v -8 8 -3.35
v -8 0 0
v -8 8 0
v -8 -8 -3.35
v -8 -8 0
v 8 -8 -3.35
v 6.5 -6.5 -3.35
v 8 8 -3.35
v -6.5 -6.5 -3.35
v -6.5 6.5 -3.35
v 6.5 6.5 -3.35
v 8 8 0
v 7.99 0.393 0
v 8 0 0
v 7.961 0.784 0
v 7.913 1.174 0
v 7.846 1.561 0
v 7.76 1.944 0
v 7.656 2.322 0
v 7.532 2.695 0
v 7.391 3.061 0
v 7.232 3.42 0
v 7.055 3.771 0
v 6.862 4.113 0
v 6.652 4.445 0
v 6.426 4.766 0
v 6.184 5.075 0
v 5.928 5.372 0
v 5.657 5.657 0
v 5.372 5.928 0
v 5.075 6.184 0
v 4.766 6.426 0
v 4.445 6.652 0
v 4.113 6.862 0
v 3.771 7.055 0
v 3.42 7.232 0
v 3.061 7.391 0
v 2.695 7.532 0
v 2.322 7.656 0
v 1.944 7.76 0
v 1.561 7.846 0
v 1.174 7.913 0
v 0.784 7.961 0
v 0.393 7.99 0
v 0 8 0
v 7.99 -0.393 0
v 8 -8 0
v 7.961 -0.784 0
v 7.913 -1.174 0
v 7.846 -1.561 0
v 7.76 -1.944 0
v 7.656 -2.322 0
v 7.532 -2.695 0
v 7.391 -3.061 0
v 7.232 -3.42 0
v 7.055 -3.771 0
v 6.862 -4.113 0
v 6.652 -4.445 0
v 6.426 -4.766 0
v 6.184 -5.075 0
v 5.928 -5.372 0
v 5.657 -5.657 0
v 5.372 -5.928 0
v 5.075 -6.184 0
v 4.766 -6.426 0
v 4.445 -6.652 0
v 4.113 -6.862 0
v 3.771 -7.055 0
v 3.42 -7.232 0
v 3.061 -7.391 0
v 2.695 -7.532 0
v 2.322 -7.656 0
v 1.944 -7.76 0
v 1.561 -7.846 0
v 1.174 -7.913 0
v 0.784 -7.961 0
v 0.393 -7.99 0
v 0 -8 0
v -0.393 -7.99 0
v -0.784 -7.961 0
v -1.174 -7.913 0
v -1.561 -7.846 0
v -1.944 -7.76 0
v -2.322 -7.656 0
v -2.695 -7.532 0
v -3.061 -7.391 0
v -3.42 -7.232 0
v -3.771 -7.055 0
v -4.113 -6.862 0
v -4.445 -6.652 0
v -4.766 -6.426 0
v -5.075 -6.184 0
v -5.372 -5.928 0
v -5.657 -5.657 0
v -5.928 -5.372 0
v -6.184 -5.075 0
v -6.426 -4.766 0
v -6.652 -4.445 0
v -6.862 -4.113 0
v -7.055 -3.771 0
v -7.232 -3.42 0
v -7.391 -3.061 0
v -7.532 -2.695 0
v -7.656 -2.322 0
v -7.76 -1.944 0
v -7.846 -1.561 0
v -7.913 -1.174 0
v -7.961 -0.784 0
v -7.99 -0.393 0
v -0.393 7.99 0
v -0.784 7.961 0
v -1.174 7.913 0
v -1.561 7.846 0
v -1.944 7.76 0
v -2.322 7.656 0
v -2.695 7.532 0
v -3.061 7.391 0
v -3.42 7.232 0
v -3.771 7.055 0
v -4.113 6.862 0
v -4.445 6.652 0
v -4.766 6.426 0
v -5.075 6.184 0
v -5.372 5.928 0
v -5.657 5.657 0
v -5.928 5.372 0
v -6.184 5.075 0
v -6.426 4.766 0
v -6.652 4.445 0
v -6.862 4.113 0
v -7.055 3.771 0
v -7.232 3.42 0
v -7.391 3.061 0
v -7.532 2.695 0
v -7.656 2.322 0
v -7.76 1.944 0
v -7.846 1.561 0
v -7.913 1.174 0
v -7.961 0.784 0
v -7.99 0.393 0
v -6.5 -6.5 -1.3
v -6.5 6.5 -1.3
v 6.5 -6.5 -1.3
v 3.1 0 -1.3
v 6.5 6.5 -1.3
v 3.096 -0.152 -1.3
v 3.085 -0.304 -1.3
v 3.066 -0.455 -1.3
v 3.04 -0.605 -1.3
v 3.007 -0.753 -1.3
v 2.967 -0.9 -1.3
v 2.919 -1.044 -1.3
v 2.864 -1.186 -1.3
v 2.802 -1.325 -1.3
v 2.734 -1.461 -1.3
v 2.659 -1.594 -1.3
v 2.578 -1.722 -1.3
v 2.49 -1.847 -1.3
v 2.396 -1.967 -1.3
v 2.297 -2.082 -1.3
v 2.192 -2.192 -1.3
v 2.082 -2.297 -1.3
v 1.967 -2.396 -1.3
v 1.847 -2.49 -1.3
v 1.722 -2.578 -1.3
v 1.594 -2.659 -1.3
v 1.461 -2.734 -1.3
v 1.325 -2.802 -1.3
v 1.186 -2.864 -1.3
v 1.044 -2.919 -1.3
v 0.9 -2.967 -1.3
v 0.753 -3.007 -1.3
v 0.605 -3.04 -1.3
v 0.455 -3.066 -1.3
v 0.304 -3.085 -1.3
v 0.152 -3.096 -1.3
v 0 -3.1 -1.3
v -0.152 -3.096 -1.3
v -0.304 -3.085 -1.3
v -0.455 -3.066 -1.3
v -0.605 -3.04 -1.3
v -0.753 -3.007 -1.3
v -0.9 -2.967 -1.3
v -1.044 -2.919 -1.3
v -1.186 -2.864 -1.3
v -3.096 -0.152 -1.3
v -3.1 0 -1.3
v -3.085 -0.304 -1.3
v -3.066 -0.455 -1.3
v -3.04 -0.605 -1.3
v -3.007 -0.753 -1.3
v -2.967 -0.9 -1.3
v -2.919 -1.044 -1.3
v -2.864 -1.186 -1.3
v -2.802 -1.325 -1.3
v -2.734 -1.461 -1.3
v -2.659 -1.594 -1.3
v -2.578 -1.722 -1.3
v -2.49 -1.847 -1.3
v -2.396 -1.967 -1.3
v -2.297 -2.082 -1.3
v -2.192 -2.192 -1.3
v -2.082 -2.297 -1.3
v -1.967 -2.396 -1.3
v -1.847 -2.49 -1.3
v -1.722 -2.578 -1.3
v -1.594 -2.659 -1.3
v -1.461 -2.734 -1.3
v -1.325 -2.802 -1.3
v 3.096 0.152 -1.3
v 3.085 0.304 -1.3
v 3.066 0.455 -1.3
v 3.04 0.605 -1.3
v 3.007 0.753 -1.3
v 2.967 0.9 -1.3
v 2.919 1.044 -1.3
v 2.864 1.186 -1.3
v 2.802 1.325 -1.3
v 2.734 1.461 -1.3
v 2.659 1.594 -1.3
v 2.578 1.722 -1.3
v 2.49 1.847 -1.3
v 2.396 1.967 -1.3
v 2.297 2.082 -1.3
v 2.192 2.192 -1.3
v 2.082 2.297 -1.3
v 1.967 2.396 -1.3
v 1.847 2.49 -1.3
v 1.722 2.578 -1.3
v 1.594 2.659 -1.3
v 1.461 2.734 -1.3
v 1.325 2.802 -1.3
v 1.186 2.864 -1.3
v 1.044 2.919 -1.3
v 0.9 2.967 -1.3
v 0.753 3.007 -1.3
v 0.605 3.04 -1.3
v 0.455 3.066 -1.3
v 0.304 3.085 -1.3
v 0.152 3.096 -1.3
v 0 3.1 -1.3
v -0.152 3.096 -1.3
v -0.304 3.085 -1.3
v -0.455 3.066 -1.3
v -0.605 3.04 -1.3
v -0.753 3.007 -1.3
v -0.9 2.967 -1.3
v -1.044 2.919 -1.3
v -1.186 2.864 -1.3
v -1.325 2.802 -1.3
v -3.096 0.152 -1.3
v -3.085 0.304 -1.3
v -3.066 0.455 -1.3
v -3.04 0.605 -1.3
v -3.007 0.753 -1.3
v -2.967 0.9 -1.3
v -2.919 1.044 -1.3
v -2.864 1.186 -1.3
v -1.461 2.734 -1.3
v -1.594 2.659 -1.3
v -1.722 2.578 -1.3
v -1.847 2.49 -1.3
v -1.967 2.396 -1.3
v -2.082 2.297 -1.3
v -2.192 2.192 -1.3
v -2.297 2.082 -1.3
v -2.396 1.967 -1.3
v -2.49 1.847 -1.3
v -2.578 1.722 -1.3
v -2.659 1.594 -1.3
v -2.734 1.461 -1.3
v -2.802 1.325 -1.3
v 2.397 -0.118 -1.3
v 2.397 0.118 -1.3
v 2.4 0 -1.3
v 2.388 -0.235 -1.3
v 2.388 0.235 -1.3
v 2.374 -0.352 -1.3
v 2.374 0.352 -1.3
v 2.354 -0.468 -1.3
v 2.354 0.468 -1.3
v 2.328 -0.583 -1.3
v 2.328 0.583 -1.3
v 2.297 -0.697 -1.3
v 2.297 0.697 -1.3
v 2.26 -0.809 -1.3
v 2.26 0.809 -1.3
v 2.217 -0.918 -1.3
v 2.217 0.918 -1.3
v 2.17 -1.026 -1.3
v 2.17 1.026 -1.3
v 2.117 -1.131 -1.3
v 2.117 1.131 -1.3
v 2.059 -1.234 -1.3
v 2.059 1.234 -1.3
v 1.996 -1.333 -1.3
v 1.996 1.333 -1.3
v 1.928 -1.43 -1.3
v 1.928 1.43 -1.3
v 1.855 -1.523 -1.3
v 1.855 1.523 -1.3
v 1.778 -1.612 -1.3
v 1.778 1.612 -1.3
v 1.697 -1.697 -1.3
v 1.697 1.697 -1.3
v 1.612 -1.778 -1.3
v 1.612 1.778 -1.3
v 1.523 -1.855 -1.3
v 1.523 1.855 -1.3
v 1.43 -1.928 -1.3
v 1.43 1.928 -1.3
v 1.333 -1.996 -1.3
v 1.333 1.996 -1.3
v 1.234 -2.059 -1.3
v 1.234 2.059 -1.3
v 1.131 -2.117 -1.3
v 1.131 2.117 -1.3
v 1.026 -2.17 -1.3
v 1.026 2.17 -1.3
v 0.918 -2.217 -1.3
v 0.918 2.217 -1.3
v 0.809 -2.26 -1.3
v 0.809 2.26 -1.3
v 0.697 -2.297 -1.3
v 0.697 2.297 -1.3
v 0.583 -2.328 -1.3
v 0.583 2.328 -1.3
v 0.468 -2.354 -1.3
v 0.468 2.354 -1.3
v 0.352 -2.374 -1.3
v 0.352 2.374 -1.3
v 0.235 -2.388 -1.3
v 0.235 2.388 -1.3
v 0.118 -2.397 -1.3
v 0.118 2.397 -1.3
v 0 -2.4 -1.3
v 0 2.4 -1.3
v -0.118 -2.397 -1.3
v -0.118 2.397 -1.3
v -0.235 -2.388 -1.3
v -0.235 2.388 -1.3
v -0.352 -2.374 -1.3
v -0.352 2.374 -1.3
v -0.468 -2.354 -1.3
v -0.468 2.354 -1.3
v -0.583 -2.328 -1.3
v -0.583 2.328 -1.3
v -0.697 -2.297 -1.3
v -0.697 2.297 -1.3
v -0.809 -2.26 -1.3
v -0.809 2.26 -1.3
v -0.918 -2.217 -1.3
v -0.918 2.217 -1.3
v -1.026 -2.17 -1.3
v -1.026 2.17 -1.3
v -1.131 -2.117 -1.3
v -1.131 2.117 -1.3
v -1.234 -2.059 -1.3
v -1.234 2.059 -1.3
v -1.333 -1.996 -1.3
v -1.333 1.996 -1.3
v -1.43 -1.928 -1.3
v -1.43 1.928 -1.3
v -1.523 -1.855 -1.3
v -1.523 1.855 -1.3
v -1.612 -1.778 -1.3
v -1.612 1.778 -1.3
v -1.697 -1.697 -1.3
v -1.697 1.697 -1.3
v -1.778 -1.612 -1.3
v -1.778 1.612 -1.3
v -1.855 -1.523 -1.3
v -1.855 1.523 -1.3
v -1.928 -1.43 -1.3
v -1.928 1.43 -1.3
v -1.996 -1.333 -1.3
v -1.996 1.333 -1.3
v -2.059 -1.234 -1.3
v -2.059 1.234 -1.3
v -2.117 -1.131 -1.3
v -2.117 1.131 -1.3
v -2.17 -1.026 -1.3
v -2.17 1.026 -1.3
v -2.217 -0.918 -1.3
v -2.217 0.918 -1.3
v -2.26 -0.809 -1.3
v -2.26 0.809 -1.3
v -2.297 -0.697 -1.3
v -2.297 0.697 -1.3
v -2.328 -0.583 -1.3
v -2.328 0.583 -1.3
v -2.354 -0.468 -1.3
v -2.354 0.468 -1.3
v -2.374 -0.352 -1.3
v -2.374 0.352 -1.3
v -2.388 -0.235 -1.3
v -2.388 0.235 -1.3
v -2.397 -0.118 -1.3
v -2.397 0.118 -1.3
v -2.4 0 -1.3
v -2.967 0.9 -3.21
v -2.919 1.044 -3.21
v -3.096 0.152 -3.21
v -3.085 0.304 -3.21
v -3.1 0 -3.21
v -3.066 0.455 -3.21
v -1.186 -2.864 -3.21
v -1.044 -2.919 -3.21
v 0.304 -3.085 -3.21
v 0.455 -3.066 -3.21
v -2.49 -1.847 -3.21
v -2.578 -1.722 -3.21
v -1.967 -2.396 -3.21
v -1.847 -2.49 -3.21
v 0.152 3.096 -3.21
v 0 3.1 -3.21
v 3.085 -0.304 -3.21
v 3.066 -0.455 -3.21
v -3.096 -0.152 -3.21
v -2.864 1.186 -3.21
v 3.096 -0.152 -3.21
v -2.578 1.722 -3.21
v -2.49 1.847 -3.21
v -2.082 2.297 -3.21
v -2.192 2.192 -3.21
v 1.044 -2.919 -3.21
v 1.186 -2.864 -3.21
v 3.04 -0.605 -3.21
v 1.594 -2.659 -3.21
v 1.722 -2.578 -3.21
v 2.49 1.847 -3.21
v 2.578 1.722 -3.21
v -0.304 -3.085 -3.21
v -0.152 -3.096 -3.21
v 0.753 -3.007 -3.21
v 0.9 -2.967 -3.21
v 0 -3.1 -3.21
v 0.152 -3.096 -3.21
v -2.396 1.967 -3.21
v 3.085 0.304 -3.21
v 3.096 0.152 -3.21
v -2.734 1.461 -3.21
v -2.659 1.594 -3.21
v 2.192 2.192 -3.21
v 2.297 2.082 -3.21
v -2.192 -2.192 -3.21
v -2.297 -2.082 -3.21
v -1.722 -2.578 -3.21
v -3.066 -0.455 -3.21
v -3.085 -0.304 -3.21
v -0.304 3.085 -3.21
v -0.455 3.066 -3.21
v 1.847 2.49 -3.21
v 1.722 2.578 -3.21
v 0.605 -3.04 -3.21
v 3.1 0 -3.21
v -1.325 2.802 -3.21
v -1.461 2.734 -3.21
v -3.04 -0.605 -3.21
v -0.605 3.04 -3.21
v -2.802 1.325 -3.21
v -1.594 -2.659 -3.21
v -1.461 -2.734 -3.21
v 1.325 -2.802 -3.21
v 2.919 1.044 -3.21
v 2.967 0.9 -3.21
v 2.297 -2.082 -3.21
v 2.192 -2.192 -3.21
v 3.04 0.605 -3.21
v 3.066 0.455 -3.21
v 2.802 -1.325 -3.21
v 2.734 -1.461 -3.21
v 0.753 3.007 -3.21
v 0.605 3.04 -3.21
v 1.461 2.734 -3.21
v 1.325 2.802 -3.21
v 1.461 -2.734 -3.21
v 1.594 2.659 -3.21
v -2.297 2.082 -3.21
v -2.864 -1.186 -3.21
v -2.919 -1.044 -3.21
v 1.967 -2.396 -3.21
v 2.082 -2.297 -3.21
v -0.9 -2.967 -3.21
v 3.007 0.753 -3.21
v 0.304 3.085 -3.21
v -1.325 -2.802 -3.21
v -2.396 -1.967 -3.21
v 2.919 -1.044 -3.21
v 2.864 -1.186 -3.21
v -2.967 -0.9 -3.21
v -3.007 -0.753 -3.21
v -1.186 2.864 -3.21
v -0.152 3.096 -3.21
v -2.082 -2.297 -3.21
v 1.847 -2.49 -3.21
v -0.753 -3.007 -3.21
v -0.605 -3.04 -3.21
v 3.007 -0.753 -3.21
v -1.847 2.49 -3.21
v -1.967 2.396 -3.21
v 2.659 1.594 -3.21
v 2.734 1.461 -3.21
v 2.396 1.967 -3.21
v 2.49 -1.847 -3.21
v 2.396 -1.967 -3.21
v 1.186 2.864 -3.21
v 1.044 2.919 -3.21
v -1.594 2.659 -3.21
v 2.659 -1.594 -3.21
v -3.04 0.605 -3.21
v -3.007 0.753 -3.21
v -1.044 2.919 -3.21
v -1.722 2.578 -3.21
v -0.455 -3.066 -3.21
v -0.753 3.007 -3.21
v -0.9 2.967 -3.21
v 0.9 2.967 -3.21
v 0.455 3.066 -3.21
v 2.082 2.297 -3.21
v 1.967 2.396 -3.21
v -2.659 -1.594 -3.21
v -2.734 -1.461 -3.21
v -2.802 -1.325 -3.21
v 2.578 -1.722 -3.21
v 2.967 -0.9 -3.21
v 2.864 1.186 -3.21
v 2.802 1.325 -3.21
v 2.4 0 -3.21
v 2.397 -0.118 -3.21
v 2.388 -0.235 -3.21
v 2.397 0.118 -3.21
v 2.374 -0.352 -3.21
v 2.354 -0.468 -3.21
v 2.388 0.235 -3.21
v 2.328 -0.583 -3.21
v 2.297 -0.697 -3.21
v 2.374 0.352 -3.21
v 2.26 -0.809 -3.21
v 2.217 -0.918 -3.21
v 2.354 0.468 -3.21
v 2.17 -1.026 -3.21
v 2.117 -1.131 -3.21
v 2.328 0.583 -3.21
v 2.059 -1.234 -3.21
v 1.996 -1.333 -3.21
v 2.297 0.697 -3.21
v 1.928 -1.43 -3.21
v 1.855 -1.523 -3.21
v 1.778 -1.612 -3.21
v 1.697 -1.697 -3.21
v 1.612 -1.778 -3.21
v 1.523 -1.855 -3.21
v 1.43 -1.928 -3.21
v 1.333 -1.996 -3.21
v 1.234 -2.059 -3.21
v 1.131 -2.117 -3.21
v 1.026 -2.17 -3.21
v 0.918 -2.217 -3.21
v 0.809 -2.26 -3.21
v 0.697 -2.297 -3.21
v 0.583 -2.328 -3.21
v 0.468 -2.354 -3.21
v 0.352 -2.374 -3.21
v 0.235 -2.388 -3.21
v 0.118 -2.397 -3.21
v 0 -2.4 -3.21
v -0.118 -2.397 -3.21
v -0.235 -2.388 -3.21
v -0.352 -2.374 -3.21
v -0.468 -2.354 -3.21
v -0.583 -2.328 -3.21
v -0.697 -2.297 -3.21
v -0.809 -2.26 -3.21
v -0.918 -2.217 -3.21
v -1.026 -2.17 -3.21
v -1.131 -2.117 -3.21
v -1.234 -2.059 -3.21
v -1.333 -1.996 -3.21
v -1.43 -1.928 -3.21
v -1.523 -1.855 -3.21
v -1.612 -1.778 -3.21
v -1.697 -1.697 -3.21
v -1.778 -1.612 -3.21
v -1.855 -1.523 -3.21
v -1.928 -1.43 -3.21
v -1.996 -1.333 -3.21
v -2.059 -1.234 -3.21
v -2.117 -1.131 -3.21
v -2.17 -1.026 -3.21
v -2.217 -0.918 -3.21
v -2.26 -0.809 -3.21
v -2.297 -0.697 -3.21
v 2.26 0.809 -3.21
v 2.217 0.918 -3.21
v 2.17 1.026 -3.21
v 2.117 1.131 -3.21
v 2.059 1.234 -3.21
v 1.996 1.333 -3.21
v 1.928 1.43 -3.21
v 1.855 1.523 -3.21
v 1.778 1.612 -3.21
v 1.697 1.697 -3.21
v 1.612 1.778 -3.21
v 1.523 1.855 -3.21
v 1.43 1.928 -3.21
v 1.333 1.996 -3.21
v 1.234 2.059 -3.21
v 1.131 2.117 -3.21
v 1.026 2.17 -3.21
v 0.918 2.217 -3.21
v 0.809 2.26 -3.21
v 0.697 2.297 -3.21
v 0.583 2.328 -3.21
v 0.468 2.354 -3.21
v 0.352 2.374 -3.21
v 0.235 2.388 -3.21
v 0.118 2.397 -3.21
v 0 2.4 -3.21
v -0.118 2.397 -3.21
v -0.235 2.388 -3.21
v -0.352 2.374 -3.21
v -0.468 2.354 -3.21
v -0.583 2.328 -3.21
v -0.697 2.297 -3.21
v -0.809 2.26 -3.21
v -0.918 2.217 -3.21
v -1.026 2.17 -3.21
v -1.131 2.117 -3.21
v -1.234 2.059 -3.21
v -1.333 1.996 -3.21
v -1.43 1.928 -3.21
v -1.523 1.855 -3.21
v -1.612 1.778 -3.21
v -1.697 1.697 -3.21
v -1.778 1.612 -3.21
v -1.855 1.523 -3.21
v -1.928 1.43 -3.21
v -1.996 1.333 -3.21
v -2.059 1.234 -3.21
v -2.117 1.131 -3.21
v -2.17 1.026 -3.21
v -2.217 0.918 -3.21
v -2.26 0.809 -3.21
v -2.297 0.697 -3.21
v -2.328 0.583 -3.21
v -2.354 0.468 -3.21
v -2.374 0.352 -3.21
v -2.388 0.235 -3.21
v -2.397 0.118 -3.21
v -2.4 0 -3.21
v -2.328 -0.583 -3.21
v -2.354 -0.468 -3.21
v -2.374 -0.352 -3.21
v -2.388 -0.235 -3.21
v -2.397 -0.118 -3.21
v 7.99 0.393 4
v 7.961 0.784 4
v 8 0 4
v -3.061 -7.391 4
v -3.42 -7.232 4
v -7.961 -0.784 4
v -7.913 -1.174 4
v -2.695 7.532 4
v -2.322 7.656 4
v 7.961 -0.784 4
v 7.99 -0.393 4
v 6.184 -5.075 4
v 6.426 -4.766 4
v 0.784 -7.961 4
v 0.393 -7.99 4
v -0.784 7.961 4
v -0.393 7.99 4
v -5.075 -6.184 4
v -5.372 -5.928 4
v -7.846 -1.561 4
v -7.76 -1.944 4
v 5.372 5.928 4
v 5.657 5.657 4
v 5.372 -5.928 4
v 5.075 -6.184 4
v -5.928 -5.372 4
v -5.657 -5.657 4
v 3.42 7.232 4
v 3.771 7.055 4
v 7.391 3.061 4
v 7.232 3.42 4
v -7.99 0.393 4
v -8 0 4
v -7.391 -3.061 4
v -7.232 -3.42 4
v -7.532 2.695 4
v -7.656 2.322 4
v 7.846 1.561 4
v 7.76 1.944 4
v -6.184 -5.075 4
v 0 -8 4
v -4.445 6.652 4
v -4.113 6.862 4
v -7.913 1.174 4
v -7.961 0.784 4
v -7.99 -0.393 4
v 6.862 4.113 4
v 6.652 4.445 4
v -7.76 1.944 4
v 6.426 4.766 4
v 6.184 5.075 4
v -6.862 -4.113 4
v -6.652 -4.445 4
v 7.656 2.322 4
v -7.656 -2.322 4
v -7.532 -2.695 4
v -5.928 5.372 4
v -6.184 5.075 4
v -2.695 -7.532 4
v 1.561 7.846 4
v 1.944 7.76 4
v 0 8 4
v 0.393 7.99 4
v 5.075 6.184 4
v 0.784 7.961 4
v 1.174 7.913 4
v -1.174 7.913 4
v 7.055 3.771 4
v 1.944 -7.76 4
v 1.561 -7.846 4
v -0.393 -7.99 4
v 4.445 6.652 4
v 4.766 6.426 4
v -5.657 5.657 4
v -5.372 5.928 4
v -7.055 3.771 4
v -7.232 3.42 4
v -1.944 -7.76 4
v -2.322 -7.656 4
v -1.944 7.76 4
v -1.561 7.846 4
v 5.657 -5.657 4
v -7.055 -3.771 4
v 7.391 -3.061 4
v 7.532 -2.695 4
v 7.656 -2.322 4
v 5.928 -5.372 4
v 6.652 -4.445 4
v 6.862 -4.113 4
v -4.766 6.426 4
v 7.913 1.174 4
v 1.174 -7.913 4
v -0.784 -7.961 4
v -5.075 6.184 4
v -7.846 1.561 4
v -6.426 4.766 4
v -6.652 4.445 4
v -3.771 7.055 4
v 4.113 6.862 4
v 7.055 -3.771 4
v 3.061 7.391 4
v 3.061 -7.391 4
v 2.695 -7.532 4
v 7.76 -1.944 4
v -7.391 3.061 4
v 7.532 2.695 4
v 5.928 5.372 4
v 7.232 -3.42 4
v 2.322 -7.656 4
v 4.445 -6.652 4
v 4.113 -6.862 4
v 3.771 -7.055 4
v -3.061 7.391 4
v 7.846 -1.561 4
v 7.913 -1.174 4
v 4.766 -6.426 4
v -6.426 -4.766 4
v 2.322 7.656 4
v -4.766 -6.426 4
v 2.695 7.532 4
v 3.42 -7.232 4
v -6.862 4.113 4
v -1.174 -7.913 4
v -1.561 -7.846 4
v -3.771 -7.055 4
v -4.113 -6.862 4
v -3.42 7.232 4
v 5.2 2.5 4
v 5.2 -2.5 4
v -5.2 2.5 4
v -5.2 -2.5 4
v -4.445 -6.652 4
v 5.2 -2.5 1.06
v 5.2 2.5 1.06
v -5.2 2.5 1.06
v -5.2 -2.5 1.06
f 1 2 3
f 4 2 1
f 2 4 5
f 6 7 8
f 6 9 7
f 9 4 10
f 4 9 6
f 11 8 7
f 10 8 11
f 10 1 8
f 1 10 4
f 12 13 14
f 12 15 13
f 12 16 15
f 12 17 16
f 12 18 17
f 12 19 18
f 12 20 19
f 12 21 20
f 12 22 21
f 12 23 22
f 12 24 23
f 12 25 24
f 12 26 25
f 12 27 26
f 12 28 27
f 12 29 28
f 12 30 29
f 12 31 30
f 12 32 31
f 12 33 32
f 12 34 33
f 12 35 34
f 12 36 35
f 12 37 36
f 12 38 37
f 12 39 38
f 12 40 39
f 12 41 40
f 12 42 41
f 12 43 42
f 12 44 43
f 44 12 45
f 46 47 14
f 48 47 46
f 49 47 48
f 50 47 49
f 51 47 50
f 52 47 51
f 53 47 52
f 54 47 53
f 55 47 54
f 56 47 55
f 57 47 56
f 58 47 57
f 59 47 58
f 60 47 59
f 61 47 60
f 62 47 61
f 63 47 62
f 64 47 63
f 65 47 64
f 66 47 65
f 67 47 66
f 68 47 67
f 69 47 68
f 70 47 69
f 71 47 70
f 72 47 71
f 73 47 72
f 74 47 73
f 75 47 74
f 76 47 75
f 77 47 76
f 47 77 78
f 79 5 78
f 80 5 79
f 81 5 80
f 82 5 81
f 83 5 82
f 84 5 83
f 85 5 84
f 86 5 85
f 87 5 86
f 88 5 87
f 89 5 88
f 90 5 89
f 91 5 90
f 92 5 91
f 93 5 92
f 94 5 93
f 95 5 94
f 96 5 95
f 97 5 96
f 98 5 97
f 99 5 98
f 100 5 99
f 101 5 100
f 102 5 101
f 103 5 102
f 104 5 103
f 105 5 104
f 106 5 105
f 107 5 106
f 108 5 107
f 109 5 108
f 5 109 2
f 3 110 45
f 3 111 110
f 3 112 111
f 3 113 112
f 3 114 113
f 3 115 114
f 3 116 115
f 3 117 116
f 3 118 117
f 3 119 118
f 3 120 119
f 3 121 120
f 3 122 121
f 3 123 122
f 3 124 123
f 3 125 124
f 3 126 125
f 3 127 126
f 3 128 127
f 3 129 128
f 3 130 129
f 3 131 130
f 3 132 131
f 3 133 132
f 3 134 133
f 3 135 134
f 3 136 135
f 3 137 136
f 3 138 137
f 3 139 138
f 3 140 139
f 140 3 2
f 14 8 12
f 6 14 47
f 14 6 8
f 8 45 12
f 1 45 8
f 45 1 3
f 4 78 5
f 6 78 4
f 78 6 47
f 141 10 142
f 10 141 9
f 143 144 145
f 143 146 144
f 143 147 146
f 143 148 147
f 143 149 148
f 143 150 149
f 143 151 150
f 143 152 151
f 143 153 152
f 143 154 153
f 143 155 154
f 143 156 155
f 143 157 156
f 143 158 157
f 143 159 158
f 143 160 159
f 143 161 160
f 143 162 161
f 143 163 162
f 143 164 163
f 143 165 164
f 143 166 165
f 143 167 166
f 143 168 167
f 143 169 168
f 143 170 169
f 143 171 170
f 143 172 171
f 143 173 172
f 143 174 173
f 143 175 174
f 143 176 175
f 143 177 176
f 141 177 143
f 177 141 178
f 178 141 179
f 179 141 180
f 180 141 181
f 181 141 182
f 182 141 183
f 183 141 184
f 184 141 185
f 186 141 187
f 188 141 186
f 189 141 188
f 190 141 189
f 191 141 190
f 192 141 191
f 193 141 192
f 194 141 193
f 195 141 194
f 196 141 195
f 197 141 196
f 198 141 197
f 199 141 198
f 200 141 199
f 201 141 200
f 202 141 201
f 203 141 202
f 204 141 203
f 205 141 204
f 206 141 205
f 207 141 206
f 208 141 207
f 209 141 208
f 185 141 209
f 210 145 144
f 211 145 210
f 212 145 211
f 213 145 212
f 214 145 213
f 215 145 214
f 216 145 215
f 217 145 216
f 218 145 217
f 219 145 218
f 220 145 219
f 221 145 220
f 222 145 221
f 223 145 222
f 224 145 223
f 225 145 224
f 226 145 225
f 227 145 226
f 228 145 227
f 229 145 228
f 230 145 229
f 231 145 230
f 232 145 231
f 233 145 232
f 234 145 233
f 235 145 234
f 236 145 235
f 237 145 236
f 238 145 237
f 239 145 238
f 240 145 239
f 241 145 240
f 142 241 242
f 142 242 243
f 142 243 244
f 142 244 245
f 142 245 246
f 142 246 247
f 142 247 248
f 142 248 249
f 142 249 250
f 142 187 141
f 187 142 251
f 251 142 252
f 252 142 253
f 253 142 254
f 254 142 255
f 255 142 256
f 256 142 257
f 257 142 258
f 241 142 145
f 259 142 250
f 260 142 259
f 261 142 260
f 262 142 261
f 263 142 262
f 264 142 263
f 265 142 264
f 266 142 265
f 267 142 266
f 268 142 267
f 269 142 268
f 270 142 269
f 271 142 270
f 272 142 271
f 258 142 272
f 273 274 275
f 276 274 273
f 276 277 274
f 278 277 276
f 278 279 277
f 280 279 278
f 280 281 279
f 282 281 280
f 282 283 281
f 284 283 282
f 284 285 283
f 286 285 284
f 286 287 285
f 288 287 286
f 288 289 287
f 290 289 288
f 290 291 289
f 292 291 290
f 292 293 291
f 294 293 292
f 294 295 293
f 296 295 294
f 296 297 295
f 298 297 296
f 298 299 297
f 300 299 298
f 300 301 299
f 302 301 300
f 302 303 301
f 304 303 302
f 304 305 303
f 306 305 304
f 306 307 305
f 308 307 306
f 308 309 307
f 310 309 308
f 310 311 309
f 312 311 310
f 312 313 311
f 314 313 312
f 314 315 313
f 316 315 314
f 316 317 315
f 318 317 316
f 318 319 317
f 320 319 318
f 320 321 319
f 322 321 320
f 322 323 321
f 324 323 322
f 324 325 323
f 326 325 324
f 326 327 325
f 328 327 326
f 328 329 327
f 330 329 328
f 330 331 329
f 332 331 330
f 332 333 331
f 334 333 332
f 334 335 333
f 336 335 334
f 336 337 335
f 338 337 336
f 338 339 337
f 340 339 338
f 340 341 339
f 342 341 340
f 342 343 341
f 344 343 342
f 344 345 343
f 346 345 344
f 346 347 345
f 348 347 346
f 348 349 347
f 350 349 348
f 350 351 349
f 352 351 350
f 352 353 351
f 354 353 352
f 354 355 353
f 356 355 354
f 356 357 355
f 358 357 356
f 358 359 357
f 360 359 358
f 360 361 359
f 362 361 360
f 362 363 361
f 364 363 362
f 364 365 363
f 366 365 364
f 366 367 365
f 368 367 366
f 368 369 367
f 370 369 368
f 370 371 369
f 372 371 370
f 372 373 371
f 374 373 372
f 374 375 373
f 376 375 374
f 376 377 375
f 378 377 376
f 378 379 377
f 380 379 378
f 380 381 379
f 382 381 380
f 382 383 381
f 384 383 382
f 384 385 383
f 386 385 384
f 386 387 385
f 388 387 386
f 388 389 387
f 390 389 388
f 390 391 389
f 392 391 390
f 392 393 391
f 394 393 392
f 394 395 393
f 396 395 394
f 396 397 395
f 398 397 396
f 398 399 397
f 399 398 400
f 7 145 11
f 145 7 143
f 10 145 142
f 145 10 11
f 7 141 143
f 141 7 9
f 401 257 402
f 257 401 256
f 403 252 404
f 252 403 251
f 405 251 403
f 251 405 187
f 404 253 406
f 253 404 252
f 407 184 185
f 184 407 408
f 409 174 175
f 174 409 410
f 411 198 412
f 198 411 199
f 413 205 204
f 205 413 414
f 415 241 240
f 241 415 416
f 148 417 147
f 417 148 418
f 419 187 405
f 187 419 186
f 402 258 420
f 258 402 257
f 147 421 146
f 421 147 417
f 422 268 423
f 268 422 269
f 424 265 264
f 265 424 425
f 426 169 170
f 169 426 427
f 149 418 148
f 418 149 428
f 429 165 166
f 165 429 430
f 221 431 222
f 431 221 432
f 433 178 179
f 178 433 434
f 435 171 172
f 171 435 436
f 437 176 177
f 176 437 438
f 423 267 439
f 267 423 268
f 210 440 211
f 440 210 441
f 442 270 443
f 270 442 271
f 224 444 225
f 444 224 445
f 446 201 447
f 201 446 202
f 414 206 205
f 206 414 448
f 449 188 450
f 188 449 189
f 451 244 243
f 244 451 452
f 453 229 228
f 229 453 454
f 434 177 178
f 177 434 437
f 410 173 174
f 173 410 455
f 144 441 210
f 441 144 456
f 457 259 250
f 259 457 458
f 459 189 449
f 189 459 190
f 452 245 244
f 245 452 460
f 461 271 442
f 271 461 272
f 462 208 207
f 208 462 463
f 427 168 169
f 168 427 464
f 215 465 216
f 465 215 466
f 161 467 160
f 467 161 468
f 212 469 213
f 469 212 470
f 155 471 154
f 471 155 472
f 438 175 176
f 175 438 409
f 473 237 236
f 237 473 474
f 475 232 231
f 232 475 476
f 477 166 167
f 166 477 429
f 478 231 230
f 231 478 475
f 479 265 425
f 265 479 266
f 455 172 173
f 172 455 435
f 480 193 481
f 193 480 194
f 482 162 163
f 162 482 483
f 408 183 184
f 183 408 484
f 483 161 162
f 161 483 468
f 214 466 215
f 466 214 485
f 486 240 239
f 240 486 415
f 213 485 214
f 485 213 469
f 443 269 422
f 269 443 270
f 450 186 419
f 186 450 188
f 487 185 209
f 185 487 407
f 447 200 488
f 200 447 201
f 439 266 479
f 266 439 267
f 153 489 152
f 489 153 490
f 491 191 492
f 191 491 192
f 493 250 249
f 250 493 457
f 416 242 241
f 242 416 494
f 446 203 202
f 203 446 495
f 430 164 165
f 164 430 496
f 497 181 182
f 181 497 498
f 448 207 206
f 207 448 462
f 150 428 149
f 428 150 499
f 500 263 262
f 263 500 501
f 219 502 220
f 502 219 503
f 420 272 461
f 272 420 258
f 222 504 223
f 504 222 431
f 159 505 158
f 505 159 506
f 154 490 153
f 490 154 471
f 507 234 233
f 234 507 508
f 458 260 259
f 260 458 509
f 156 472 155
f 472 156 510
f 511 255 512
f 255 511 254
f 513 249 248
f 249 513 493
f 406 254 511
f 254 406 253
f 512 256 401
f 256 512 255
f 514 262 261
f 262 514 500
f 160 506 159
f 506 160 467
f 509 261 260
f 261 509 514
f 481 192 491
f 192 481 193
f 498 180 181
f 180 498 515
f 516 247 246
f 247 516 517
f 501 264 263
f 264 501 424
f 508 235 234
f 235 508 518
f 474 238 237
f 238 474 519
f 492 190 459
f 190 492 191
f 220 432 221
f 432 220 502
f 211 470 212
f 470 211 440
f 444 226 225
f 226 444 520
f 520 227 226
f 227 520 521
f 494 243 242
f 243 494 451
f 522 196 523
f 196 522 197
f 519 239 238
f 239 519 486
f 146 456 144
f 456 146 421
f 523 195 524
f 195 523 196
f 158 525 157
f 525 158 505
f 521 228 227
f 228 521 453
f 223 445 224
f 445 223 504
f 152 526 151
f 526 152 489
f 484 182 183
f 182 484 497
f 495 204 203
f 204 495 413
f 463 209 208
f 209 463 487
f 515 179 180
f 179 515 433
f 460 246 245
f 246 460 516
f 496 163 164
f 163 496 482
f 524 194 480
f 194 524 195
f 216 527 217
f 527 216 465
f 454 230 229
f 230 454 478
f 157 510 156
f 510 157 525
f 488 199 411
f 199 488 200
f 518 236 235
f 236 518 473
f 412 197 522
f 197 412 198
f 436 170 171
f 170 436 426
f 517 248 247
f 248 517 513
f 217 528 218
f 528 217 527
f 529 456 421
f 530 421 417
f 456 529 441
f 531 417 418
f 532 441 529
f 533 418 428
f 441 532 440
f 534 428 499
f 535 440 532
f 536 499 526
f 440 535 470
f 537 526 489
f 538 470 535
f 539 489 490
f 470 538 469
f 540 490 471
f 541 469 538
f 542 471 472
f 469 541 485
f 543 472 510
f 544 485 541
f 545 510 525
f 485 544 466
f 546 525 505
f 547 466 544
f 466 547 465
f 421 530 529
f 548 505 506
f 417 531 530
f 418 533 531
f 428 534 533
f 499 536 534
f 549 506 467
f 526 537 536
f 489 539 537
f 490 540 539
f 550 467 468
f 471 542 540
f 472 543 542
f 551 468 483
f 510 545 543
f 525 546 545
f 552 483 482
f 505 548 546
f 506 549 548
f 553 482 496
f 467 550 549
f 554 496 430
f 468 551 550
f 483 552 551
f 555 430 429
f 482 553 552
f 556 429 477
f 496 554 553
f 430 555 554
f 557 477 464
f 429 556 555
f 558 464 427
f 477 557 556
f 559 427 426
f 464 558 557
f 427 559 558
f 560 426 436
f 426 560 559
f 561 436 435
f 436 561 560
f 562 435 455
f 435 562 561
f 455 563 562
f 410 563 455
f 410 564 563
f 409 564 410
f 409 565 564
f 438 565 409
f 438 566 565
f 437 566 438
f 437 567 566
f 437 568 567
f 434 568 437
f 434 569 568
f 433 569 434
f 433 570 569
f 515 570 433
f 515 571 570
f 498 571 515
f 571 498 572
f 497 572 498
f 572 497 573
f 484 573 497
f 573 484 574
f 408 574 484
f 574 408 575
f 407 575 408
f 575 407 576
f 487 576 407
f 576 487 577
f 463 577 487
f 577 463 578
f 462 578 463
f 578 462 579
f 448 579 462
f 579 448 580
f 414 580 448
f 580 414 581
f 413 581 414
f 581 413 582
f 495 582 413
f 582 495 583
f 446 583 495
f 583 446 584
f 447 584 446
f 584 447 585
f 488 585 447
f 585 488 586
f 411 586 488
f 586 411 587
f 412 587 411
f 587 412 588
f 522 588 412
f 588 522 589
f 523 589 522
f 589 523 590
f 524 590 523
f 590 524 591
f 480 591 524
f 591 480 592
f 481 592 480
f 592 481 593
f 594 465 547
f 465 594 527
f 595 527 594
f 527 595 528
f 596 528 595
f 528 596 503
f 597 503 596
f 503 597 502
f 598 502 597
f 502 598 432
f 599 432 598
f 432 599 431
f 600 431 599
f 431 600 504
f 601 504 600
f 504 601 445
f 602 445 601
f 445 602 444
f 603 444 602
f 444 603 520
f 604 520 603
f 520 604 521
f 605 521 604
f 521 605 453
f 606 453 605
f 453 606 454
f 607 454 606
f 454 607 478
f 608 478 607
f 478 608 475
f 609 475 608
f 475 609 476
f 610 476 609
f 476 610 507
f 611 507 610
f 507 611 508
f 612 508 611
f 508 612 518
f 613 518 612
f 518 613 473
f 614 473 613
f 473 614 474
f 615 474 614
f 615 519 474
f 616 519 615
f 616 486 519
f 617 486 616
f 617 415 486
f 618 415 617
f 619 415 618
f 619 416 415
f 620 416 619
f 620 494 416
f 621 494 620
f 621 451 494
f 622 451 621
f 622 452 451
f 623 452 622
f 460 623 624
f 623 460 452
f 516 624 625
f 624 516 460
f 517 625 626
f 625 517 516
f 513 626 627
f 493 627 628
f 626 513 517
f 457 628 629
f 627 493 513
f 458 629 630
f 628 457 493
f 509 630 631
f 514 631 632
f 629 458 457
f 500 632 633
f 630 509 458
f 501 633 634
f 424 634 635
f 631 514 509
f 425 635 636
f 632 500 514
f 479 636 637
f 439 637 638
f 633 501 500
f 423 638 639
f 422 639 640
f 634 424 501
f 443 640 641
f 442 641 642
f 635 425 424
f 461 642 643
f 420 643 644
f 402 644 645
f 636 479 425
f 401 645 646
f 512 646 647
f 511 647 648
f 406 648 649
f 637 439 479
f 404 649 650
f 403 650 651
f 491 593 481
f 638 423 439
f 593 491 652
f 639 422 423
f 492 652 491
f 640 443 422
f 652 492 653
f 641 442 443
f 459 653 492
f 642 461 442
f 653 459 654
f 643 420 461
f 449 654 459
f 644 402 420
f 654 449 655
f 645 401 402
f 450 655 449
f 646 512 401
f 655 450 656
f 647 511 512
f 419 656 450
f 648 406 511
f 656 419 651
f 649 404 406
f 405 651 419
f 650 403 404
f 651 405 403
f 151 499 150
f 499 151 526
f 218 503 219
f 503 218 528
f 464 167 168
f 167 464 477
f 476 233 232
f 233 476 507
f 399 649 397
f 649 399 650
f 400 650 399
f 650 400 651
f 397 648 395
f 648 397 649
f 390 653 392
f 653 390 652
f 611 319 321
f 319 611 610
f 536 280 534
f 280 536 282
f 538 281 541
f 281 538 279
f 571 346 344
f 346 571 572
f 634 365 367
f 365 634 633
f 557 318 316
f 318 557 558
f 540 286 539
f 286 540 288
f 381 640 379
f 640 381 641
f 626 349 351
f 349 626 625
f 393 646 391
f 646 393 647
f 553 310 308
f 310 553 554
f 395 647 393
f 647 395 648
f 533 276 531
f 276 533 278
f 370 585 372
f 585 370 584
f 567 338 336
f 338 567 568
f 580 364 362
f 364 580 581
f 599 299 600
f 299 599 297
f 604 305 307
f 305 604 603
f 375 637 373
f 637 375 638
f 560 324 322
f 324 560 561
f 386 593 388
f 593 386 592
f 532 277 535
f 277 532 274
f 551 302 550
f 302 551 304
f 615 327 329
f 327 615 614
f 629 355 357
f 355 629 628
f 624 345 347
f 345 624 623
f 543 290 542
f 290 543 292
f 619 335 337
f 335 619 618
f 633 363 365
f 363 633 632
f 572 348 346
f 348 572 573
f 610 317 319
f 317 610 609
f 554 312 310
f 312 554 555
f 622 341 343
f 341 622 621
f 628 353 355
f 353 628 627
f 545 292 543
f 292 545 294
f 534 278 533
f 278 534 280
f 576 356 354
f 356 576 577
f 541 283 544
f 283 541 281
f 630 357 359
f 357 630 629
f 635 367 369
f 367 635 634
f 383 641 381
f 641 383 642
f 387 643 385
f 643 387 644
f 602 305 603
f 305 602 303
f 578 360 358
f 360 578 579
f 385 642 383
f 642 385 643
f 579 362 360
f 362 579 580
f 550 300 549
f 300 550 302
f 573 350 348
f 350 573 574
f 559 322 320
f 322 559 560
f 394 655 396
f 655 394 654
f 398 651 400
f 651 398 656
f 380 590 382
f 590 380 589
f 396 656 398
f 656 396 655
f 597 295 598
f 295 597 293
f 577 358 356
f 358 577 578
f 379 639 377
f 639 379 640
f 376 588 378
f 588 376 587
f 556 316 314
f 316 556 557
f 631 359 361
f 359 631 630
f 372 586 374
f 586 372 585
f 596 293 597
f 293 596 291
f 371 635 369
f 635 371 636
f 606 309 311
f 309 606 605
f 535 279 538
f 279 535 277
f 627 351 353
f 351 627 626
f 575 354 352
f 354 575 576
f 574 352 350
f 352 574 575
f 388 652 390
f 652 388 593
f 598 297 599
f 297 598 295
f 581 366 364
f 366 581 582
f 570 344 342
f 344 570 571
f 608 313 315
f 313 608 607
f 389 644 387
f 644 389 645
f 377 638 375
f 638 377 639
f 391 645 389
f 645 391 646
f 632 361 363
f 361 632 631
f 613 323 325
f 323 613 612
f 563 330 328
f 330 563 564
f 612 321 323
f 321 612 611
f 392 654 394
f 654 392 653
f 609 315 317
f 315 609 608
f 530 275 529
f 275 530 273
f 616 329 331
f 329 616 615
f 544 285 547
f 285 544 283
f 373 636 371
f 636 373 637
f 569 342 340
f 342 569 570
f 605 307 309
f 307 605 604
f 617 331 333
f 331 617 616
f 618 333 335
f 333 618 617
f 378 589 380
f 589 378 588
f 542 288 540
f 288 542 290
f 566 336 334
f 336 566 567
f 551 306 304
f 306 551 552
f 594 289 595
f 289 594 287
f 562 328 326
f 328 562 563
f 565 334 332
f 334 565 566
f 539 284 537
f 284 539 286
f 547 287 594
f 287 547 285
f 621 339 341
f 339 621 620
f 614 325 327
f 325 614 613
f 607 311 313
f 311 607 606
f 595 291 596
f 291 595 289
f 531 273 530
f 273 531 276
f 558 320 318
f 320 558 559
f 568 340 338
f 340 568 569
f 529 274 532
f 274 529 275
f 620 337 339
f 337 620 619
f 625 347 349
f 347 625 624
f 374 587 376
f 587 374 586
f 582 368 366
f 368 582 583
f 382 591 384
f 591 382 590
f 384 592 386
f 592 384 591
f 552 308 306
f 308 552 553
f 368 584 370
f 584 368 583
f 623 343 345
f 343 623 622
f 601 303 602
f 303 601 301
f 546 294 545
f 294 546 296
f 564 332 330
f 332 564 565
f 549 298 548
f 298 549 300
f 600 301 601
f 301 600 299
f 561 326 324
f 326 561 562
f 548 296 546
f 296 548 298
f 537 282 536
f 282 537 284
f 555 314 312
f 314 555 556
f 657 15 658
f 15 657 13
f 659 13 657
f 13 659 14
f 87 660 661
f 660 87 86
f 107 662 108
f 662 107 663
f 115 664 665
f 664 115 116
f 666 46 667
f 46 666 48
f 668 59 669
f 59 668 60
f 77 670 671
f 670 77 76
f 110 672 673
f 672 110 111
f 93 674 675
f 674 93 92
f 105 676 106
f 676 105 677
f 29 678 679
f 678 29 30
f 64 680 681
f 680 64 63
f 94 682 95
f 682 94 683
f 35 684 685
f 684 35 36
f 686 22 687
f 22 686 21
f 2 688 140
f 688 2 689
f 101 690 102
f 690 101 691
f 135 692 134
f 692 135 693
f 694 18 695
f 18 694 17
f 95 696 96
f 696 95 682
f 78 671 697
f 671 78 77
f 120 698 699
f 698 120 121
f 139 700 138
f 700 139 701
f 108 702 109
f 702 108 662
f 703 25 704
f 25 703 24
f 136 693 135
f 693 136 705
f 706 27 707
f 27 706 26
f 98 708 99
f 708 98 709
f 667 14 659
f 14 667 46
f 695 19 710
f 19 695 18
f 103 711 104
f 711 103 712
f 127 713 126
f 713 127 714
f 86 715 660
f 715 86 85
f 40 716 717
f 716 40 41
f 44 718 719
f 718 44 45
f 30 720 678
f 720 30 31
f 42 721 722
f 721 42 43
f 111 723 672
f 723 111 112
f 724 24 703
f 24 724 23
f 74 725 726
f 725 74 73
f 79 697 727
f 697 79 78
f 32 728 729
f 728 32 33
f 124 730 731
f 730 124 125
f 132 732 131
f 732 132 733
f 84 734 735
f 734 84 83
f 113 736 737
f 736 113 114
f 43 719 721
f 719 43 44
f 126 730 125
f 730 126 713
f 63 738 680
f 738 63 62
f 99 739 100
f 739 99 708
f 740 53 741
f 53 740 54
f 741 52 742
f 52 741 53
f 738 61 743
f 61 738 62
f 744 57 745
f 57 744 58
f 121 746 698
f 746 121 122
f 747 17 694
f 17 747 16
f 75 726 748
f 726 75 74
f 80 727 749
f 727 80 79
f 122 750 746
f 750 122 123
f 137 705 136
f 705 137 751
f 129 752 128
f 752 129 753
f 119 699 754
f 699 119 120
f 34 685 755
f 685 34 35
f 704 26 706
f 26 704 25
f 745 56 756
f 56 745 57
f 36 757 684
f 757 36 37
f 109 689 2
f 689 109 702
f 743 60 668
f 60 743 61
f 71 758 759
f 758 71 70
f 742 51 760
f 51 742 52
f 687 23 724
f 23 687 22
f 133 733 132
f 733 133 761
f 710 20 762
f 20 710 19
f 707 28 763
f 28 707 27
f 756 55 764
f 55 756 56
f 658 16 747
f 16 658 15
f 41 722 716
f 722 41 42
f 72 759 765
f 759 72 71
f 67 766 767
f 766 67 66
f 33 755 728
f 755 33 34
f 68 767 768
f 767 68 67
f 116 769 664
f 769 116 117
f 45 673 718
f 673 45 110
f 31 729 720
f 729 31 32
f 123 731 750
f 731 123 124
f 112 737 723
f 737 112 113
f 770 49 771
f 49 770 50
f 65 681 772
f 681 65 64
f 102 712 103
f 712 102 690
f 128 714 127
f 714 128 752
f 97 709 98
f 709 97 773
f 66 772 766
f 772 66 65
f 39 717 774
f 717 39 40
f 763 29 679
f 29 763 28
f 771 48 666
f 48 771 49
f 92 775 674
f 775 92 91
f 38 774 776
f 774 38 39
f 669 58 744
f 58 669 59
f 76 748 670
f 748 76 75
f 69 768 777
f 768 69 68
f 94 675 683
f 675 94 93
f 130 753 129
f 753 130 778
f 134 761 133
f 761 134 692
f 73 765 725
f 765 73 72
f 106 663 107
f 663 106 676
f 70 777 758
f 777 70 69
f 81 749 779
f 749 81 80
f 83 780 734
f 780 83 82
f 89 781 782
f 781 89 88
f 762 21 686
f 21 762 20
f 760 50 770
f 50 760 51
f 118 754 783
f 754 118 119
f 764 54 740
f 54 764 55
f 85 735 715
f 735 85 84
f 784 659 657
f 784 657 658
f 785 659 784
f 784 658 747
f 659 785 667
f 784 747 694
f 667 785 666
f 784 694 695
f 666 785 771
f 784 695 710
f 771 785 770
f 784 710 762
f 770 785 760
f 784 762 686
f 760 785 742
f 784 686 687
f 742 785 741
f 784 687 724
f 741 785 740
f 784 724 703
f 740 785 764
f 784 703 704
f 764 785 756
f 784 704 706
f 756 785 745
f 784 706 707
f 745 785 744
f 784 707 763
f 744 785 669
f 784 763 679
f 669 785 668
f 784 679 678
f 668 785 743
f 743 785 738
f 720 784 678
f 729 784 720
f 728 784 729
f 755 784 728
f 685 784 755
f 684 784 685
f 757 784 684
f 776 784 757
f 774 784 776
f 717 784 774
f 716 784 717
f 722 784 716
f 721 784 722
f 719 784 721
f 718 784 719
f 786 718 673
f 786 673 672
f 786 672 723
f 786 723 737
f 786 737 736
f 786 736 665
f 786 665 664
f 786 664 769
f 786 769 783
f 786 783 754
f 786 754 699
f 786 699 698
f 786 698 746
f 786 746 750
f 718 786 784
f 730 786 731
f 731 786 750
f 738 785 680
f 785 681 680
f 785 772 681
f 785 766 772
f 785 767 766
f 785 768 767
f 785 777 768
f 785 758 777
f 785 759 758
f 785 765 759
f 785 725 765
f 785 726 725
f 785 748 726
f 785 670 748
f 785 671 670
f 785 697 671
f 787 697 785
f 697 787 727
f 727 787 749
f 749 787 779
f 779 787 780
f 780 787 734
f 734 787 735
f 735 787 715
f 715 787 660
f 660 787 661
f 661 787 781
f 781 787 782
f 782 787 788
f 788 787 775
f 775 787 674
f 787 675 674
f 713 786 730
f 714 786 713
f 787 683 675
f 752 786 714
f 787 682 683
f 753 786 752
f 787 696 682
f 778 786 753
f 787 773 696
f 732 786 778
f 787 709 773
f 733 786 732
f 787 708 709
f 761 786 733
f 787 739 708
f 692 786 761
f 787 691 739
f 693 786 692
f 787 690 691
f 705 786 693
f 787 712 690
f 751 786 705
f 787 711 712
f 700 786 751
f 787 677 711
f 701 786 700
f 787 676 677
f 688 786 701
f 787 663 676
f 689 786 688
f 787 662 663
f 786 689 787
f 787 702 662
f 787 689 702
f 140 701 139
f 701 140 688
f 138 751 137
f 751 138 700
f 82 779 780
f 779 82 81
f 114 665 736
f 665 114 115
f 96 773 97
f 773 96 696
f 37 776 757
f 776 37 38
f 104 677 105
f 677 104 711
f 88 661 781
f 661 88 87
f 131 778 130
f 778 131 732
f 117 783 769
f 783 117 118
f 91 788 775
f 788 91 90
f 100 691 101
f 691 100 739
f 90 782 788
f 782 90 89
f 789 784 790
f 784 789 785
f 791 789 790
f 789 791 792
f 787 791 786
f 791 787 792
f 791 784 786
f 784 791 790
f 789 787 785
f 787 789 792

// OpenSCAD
// file: ../lego_factory/lego_manifacture.scad
//Settings

// Studs
print_width = 0.4; 
stud_height_top = 2.3;
stud_height_bottom = 3.21;
ring_diameter_outer = 6.2;
ring_diameter_inner = 4.80;
// stud_gap is the gap between the studs in x and y direction
stud_gap = 8;

ring_diameter_top_stud = 4.88;
//========================

// Plate
lego_plate_outer_length_x = 8;
lego_plate_outer_length_y = 8;
lego_plate_inner_gap = 3;
plate_height = 3.35;


// Lego modules

/*
Info

"build_lego_piece( x, y , layers, boolean;

layers can only be 1 or 2.
If x or y is less than 3, there will be no studs at the bottom
The range for x and y is from 1 to infinity

With the module "build_lego_piece_with_only_top_studs(a, b, c, boolean)", you have two choices:
boolean = true: The lego_plate_top is filled out
boolean = false: The lego_plate_top is hollow at the bottom
*/

//build_lego_piece_with_both_top_and_bottom_studs(2,2,1, true);
//build_lego_piece_with_only_top_studs(2,2,1, false);
//build_lego_piece_with_only_bottom_studs(1,4,1, true);

module build_lego_piece_with_both_top_and_bottom_studs(a, b, c, boolean)
{
    union()
    {
        lego_plate_top(a , b , c, boolean);
        translate([8, 8, 0]) {
            stud_bottom(a,b,c);
        }
        translate([4, 4, -stud_height_top]) {
            stud_top(a,b);
        }
    }
}

module build_lego_piece_with_only_top_studs(a, b, c, boolean)
{
    union()
    {
        lego_plate_top(a , b , c, boolean);
        translate([4, 4, -stud_height_top]) {
            stud_top(a,b);
        }
    }
}

module build_lego_piece_with_only_bottom_studs(a, b, c, boolean)
{
    union()
    {
        lego_plate_top(a , b , c, boolean);
        translate([8, 8, 0]) {
            stud_bottom(a,b,c);
        }
    }
}

module lego_plate_top(x, y, layers, boolean)
{
    layers = layers == 1 ? plate_height : plate_height * 3;

    if (boolean) {
    difference()
    {
        cube(size=[lego_plate_outer_length_x * x, lego_plate_outer_length_y * y, layers]);
        translate([lego_plate_inner_gap / 2, lego_plate_inner_gap / 2, 1.3])
        {
            cube(size=[(lego_plate_outer_length_x * x) - lego_plate_inner_gap , (lego_plate_outer_length_y * y) - lego_plate_inner_gap, layers]);
        }
    }     
    } else {
        cube(size=[lego_plate_outer_length_x * x, lego_plate_outer_length_y * y, layers]);
    }
}

module stud_top(x,y)
{

    for (xPos = [0 : x - 1])
    for (yPos = [0 : y - 1])
        translate([ (stud_gap * xPos), (stud_gap * yPos), 0 ])
        {
            cylinder( d=ring_diameter_top_stud, h=stud_height_top,$fn=128);
        }
}

module stud_bottom(x,y,layers) 
{
layers = layers == 1 ? stud_height_bottom : (stud_height_bottom * (layers+1));
//y = y == 2 ? 3 : y;
//x = x == 2 ? 3 : x;

if (x == 2 && y > 1) {
    for (xPos = [0 : 0])
    for (yPos = [0 : y - 2])
        translate([ (stud_gap * xPos), (stud_gap * yPos), 0 ])
        difference()
        {
            cylinder( d=ring_diameter_outer, h=layers,$fn=128);
            translate([0, 0, -1]) 
            {
                cylinder( d=ring_diameter_inner, h=layers+2,$fn=128);
            }              
        }
} else if (y == 2 && x > 1) {
    for (xPos = [0 : x - 2])
    for (yPos = [0 : 0])
        translate([ (stud_gap * xPos), (stud_gap * yPos), 0 ])
        difference()
        {
            cylinder( d=ring_diameter_outer, h=layers,$fn=128);
            translate([0, 0, -1]) 
            {
                cylinder( d=ring_diameter_inner, h=layers+2,$fn=128);
            }
                    
        }
} else if (x <= 1 || y <= 1) {

    echo(str("No Circle"));

} else {
    for (xPos = [0 : x-2])
    for (yPos = [0 : y-2])
        translate([ (stud_gap * xPos), (stud_gap * yPos), 0 ])
        difference()
        {
            cylinder( d=ring_diameter_outer, h=layers,$fn=128);
            translate([0, 0, -1]) 
            {
                cylinder( d=ring_diameter_inner, h=layers+2,$fn=128);
            }                
        }
    }
}
// main file
include <../lego_factory/lego_manifacture.scad>

//Magnets for registrering train travel
magnet_x = 10.4;
magnet_y = 5;
magnet_z = 2.96;

magnet_holder_z = 4;



build_track_magnet();

module build_track_magnet()
{
    translate([lego_plate_outer_length_x , -lego_plate_outer_length_x, 0]) {
        rotate([0, 180, 0]) {
            build_lego_piece_with_only_bottom_studs(2,2,1, true); 
        }
    }
    difference()
    {
        magnet_holder();
       #magnet();
    }
}

module magnet_holder()
{
    cylinder(d=lego_plate_outer_length_x * 2, h=magnet_holder_z, $fn=128);
}

module magnet()
{
    translate([0, 0, (magnet_holder_z - magnet_z) + 1.5]) {
        cube(size=[magnet_x, magnet_y, magnet_z], center=true);
    }
}
